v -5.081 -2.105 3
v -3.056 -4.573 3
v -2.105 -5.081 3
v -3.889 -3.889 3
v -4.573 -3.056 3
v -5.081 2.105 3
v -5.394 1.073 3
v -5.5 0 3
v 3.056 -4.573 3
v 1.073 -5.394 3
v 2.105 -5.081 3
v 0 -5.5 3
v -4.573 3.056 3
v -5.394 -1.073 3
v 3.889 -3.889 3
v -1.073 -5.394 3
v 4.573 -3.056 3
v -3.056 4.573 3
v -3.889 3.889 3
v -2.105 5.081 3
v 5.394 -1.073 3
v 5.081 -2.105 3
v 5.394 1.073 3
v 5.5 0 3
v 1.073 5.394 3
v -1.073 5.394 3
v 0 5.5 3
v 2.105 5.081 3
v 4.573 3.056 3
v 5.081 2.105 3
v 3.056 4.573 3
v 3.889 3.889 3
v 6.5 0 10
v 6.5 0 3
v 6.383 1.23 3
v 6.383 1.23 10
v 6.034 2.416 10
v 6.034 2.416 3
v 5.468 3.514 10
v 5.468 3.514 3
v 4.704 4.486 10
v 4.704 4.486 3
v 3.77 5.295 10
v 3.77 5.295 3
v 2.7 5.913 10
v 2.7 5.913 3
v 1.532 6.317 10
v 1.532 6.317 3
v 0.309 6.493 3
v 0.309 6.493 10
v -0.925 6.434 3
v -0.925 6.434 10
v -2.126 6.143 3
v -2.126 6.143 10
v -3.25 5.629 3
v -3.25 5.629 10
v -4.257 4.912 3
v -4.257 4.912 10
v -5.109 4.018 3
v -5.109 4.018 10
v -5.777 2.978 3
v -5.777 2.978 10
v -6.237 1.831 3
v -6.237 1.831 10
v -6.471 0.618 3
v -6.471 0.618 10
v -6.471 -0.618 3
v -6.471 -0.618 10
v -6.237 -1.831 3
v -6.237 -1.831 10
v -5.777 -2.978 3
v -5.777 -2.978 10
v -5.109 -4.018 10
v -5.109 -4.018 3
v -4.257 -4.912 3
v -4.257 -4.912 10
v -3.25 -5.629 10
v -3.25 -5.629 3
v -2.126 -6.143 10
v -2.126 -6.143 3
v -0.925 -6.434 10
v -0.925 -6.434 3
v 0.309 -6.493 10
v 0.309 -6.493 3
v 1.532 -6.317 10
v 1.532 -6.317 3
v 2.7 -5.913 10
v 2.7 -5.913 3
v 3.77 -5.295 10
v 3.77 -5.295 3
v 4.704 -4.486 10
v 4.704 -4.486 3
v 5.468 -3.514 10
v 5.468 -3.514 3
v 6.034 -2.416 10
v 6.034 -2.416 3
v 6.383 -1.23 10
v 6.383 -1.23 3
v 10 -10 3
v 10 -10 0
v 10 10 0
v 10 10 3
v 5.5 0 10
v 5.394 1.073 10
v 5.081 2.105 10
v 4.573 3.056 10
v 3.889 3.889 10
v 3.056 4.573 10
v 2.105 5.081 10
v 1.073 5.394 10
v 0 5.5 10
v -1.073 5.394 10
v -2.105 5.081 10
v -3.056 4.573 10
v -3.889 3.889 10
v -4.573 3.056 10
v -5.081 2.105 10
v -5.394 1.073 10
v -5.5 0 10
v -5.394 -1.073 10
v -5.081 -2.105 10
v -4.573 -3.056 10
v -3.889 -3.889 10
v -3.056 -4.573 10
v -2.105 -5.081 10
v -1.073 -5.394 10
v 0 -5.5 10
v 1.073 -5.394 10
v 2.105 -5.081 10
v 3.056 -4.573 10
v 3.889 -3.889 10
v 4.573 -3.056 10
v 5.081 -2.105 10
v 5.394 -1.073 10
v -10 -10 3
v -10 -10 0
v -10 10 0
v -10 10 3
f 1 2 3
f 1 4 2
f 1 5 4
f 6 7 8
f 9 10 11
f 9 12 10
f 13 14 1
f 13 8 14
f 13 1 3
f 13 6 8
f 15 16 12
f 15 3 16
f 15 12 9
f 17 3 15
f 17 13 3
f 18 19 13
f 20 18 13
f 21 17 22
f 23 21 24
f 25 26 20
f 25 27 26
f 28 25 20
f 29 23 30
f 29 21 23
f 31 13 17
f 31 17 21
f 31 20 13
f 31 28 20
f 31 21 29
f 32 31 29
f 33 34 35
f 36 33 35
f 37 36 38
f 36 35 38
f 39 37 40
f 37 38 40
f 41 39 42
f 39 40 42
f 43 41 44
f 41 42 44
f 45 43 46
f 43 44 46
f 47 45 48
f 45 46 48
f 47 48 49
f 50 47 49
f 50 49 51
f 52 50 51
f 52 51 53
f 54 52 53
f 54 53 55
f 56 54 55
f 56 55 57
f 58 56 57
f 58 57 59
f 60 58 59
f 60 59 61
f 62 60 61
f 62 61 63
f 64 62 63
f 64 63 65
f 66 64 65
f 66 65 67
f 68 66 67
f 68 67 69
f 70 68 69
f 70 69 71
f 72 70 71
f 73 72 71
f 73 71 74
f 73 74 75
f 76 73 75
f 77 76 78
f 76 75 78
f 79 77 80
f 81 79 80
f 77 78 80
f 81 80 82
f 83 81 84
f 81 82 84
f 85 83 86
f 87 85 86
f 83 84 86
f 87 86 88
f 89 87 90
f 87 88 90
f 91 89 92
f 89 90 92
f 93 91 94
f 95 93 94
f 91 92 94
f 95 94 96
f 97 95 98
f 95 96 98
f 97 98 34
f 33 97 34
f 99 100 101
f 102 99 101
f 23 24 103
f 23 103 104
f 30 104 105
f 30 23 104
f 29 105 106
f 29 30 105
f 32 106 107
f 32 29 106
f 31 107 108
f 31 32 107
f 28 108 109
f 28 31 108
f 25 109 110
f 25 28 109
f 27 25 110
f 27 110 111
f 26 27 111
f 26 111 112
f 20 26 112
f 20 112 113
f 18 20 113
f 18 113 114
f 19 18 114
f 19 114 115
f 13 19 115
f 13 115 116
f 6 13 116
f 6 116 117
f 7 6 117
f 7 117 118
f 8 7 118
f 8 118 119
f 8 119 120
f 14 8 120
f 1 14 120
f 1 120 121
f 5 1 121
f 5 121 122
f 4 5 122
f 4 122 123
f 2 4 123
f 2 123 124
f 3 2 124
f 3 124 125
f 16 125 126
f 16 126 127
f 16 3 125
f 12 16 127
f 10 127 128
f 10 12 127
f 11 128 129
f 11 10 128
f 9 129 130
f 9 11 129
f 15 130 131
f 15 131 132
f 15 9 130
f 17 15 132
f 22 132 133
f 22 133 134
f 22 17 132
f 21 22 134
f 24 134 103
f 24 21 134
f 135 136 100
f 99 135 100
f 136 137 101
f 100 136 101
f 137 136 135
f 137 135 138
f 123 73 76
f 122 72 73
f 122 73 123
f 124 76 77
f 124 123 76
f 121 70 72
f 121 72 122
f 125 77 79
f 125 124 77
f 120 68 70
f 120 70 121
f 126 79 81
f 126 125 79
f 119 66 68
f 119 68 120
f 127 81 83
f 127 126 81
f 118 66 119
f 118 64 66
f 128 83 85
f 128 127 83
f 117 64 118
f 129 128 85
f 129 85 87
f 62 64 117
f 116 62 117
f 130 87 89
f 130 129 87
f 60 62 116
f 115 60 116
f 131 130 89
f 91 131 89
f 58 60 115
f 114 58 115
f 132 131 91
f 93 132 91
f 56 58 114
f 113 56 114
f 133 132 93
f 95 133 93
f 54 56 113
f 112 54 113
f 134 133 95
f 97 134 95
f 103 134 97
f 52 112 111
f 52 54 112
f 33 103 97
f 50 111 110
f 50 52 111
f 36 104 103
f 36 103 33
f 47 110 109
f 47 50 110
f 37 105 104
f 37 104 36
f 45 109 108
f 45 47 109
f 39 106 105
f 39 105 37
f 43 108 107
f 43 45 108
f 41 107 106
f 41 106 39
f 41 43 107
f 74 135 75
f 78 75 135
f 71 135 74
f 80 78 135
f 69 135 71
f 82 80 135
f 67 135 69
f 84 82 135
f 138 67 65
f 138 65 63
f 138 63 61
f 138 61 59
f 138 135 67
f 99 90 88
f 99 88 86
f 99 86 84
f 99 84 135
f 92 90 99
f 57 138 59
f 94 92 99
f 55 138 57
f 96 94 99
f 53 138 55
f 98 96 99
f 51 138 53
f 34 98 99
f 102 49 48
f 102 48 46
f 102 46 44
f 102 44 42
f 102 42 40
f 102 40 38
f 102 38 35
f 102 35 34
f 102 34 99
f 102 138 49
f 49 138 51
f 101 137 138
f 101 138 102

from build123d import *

# Parameters (mm, degrees)
SKETCH_W      = 20
SKETCH_H      = 20
PAD_DEPTH     = 3
SKETCH001_R   = 6.5
SKETCH001_R_2 = 5.5
PAD001_DEPTH  = 10


with BuildPart() as part:
    # Sketch → Pad (new body)
    with BuildSketch(Plane.XY):
        Rectangle(SKETCH_W, SKETCH_H)
    extrude(amount=PAD_DEPTH)

    # Sketch001 → Pad001 (join)
    with BuildSketch(Plane.XY):
        Circle(SKETCH001_R)
        Circle(SKETCH001_R_2, mode=Mode.SUBTRACT)
    extrude(amount=PAD001_DEPTH)


solid = part.part
